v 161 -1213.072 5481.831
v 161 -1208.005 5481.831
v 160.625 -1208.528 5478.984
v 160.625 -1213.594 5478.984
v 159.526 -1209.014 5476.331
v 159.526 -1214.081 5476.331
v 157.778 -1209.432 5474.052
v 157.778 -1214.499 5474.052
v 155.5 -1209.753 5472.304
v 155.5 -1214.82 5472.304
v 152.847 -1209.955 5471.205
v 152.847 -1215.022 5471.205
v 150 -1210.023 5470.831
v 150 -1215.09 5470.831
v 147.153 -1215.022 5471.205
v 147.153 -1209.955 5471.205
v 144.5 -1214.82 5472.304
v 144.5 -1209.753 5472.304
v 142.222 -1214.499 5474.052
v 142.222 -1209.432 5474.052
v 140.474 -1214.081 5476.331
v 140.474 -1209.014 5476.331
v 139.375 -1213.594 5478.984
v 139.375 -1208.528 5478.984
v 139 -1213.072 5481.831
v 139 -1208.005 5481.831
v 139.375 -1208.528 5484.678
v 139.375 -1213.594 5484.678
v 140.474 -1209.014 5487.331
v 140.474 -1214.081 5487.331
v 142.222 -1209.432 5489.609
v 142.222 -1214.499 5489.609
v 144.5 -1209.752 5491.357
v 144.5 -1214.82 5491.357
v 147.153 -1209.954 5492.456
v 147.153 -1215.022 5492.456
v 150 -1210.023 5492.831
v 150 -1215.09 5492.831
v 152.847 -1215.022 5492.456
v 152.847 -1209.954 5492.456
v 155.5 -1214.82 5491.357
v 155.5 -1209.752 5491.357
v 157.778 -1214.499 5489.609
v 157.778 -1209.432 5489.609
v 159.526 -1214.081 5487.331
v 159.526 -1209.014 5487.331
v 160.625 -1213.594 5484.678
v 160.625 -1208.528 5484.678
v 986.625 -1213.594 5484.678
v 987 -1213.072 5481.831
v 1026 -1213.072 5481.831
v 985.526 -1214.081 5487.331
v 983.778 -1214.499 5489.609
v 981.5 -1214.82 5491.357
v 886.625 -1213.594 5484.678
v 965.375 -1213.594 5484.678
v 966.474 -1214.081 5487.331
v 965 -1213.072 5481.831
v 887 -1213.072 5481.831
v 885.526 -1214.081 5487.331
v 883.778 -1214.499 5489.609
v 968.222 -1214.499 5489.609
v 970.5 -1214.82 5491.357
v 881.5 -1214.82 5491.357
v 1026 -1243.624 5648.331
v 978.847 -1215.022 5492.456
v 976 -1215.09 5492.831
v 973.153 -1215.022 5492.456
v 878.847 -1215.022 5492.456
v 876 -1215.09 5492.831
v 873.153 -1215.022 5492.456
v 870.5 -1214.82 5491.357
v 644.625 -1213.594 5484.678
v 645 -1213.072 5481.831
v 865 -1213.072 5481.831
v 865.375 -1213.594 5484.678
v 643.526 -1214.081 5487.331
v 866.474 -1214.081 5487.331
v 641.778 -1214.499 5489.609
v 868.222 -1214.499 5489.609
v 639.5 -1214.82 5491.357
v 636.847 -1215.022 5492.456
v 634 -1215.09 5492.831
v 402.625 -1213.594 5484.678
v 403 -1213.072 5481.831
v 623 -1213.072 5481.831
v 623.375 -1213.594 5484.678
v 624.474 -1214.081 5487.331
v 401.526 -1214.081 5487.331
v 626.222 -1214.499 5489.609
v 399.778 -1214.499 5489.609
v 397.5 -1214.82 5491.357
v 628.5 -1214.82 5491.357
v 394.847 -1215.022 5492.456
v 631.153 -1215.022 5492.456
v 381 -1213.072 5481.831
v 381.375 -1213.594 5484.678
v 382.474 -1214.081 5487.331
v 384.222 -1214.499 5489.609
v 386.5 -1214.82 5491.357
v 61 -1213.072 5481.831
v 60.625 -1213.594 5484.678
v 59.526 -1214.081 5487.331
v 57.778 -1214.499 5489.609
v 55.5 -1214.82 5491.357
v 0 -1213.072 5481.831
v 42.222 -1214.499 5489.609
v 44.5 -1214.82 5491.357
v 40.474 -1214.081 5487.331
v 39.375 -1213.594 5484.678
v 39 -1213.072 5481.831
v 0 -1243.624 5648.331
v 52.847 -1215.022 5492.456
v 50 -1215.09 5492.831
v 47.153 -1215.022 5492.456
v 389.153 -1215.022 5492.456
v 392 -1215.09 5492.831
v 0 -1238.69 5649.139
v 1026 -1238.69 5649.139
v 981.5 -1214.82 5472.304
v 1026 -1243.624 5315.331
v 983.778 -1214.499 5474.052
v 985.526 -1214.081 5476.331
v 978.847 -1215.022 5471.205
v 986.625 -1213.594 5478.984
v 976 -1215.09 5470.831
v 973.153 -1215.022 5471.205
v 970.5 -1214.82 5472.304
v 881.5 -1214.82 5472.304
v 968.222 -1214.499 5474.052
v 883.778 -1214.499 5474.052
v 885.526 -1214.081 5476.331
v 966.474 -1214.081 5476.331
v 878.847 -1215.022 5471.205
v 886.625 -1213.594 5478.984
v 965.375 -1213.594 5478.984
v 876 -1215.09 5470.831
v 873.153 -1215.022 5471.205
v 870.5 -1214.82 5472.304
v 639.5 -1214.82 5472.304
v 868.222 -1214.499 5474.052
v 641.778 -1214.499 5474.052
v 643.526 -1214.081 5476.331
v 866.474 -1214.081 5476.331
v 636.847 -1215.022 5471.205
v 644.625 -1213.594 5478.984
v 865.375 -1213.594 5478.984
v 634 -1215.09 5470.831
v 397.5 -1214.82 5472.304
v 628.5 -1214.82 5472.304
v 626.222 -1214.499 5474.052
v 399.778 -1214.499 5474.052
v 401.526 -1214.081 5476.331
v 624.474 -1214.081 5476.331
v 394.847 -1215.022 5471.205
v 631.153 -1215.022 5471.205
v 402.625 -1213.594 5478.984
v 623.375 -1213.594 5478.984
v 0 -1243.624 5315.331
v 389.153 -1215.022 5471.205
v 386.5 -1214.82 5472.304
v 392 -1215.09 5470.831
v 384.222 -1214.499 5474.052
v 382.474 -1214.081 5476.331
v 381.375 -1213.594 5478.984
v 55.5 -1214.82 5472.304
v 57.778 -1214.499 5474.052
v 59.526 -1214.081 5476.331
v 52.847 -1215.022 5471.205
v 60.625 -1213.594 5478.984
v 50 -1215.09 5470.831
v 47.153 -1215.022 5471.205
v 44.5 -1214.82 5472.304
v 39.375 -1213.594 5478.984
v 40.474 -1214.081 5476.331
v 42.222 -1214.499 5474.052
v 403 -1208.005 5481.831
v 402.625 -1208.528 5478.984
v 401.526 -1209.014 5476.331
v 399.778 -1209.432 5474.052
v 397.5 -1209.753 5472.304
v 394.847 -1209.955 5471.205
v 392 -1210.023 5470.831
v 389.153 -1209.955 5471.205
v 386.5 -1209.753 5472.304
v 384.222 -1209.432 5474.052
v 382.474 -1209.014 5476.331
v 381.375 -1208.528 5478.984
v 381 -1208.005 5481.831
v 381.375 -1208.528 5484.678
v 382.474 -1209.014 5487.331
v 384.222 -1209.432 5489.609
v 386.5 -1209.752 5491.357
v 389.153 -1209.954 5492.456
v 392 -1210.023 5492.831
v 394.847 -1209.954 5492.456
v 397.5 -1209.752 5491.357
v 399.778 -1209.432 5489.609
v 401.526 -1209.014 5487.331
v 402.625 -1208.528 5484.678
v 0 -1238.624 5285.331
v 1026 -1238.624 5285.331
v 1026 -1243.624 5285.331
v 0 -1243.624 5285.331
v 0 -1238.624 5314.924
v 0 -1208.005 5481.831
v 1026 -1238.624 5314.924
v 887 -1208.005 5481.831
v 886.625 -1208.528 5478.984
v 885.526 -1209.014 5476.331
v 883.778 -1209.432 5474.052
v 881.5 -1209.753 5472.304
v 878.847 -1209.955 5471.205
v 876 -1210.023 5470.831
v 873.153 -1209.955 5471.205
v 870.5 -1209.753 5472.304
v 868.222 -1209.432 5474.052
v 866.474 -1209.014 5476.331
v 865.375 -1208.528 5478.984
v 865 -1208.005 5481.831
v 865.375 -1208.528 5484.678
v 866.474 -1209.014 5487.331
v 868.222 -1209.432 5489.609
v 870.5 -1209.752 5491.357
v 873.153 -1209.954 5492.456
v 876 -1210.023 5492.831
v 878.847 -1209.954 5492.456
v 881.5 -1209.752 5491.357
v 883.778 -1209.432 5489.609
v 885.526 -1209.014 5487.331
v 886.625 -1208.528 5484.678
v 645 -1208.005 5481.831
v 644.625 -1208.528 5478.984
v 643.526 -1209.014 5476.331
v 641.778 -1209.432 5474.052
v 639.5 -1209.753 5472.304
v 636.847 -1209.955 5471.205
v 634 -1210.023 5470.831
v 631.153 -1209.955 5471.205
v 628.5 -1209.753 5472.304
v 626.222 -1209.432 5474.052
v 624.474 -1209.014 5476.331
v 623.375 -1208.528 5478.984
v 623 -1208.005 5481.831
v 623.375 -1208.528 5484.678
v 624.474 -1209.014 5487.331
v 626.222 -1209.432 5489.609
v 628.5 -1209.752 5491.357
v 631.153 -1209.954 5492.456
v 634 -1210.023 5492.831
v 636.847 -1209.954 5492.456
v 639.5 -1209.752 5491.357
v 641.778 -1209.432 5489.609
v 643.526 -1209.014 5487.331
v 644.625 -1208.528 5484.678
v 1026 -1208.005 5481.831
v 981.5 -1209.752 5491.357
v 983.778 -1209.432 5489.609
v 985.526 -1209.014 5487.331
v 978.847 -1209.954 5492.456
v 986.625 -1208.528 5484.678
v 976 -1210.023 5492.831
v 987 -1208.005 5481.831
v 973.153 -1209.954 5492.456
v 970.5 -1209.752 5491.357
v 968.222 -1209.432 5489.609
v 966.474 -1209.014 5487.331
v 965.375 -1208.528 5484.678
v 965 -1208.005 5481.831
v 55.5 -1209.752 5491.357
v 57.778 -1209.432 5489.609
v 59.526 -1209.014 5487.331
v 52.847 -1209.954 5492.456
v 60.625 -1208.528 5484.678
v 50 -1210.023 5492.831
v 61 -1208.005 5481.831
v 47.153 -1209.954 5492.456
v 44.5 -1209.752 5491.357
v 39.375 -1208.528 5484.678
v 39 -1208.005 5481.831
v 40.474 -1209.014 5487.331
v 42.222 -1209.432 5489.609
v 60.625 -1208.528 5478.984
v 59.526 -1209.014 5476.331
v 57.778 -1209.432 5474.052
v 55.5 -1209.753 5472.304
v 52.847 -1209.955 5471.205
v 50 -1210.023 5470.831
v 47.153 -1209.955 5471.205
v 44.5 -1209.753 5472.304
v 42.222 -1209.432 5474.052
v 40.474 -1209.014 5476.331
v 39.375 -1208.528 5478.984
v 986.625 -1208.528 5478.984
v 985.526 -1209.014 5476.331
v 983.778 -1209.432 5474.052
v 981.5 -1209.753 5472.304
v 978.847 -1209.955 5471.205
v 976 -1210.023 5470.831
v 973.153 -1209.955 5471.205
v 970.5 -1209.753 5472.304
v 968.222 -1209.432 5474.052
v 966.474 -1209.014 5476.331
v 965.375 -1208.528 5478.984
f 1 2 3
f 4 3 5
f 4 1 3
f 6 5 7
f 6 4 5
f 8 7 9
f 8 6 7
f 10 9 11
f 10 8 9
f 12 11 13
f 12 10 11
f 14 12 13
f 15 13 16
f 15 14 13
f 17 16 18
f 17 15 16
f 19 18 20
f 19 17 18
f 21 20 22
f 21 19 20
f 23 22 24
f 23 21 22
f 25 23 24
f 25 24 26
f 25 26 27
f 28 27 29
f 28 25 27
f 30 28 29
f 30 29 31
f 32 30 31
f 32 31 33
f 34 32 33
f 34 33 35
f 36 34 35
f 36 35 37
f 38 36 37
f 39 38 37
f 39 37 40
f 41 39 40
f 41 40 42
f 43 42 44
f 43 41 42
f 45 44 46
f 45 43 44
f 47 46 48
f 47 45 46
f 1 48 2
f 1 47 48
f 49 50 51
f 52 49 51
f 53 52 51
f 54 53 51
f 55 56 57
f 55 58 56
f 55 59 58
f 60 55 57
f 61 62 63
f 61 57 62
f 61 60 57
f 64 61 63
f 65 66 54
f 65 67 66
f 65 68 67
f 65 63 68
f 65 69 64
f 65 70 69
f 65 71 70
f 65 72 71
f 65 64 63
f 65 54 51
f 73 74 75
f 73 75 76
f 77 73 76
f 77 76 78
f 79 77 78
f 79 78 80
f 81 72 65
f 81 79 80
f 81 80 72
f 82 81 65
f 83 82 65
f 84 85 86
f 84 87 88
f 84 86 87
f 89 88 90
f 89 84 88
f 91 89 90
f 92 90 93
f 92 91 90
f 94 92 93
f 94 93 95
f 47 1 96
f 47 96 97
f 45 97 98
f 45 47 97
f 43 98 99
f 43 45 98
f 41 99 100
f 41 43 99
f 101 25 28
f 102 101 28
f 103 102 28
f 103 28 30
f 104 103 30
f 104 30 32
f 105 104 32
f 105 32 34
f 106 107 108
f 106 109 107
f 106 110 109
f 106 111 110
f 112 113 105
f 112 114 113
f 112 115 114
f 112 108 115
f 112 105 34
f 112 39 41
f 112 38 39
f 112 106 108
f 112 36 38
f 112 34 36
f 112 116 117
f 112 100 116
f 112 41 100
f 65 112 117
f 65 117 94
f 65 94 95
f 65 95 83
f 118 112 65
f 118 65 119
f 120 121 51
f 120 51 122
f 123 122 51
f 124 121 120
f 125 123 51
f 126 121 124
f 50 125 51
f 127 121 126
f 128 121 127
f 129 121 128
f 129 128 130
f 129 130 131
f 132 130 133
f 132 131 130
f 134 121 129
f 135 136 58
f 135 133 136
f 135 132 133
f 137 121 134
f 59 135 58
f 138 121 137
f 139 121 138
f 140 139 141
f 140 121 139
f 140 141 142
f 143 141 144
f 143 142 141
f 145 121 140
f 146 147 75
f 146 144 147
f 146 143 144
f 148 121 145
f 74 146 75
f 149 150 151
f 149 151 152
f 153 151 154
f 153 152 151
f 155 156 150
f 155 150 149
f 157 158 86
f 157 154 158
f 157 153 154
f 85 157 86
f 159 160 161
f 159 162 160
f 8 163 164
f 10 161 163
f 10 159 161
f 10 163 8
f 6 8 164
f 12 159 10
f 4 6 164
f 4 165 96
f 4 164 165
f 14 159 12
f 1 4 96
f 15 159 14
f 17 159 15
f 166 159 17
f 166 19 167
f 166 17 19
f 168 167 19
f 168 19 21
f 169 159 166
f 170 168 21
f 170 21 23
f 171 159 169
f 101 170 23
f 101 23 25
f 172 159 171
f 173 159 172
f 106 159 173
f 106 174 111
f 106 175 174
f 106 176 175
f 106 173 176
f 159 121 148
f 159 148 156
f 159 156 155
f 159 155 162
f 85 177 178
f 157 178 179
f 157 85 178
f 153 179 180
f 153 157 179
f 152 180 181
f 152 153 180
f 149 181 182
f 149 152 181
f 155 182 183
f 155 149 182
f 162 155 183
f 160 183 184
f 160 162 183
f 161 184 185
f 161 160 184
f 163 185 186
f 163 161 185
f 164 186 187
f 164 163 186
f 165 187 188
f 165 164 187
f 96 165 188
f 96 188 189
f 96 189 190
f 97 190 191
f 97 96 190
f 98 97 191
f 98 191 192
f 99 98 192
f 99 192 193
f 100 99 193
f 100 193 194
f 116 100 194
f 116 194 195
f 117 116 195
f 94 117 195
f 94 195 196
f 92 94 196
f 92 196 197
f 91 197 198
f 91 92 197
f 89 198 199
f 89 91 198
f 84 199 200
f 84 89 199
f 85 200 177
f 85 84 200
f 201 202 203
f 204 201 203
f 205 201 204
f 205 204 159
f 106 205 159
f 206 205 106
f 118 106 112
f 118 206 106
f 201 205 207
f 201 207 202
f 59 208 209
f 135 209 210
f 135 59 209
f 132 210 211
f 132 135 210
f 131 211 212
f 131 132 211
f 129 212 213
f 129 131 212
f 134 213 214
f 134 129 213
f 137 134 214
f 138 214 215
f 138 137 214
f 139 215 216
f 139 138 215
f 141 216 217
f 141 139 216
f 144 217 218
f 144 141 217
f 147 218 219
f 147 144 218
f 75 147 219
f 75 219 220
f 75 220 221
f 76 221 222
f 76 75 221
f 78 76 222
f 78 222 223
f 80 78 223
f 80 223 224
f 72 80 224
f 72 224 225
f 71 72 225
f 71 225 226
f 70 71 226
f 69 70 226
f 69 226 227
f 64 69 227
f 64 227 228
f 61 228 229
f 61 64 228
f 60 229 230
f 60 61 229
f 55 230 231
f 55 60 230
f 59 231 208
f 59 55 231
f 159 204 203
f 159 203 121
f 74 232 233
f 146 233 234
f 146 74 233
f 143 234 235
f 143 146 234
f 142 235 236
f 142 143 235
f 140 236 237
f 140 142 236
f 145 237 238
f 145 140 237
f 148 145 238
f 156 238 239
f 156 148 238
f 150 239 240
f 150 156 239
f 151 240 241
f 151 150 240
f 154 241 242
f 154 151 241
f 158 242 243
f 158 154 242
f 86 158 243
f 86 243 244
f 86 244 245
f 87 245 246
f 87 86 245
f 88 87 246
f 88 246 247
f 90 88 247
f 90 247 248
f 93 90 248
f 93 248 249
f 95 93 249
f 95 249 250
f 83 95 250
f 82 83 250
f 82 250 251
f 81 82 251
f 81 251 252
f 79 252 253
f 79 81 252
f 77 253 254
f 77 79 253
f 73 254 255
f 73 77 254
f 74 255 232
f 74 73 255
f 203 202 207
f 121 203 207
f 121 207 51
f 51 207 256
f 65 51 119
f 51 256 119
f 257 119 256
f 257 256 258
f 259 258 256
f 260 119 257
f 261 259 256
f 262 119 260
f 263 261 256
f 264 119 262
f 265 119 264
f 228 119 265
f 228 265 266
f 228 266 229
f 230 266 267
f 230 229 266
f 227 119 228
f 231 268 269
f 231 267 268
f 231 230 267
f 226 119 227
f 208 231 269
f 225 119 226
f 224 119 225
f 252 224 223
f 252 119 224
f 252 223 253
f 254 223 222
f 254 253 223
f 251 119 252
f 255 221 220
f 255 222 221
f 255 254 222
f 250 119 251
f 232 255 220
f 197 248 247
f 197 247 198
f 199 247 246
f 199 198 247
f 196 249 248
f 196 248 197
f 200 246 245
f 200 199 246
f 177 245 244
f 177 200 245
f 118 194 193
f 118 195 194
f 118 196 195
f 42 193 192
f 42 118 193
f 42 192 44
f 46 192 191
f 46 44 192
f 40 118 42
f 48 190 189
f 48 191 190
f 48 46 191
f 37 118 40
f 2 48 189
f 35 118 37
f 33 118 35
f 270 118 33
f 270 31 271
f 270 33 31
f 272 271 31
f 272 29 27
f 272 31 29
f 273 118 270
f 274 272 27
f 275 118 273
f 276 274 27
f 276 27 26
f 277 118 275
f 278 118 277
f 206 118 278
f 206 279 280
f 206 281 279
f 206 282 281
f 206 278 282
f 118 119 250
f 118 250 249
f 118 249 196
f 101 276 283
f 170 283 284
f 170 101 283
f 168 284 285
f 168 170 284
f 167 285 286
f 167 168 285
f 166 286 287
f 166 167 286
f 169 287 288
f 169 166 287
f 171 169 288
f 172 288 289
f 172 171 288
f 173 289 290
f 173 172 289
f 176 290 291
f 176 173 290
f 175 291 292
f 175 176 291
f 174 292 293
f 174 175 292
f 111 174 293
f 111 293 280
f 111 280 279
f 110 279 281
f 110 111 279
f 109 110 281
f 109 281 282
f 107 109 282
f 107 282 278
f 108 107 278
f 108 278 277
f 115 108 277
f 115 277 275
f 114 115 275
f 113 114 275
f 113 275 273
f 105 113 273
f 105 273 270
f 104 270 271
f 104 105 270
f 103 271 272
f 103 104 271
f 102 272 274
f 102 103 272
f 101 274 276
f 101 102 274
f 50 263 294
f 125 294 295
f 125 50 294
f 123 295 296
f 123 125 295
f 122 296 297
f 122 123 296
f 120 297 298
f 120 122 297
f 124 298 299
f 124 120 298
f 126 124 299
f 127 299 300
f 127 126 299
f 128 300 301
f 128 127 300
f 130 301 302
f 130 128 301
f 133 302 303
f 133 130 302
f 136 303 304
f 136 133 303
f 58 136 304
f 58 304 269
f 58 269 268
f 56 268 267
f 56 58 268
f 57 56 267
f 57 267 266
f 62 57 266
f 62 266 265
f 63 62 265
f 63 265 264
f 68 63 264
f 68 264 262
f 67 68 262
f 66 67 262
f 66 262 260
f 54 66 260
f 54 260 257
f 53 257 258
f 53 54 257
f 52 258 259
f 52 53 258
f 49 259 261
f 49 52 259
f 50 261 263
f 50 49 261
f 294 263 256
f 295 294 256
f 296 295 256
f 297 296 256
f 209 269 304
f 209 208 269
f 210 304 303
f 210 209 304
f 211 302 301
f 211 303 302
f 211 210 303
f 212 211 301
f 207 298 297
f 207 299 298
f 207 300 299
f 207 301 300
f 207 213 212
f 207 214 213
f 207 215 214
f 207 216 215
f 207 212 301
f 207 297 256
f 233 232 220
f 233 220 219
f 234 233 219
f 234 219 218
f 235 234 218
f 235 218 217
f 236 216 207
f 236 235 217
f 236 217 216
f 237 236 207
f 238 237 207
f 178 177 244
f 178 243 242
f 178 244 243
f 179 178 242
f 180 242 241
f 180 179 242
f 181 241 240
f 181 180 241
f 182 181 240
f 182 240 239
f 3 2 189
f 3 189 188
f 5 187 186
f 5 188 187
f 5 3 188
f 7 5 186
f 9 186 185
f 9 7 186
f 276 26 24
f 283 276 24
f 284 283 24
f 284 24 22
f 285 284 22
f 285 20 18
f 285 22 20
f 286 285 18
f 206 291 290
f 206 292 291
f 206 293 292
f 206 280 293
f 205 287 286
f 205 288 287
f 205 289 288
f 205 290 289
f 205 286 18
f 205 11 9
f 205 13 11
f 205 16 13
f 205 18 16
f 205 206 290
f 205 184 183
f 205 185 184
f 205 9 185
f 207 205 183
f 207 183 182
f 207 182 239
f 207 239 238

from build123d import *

# Parameters (mm, degrees)
BOSS_EXTRUDE1_DEPTH     = 1026
CUT_EXTRUDE1_DEPTH      = 5875.695454102
CUT_EXTRUDE1_DEPTH_BACK = 5875.695454102
SKETCH2_R               = 11


with BuildPart() as part:
    # Sketch1 → Boss-Extrude1 (new body)
    with BuildSketch(Plane(origin=(0, 0, 0), x_dir=(0, 0, -1), z_dir=(1, 0, 0))):
        Polygon((-5649.138897543, -1238.689665232), (-5481.830586551, -1208.005375509), (-5314.923755358, -1238.623896007), (-5285.330586551, -1238.623896007), (-5285.330586551, -1243.623896007), (-5315.330586551, -1243.623896007), (-5481.830586551, -1213.072021383), (-5648.330586551, -1243.623896007), align=None)
    extrude(amount=BOSS_EXTRUDE1_DEPTH)

    # Sketch2 → Cut-Extrude1 (cut, two sides: drawn at the far end of the back side and taken through both)
    with BuildSketch(Plane(origin=(0, 0, 0), x_dir=(1, 0, 0), z_dir=(0, 1, 0)).offset(-CUT_EXTRUDE1_DEPTH_BACK)):
        with Locations((50, -5481.830586551)):
            Circle(SKETCH2_R)
        with Locations((150, -5481.830586551)):
            Circle(SKETCH2_R)
        with Locations((976, -5481.830586551)):
            Circle(SKETCH2_R)
        with Locations((876, -5481.830586551)):
            Circle(SKETCH2_R)
        with Locations((634, -5481.830586551)):
            Circle(SKETCH2_R)
        with Locations((392, -5481.830586551)):
            Circle(SKETCH2_R)
    extrude(amount=CUT_EXTRUDE1_DEPTH + CUT_EXTRUDE1_DEPTH_BACK, mode=Mode.SUBTRACT)


solid = part.part
